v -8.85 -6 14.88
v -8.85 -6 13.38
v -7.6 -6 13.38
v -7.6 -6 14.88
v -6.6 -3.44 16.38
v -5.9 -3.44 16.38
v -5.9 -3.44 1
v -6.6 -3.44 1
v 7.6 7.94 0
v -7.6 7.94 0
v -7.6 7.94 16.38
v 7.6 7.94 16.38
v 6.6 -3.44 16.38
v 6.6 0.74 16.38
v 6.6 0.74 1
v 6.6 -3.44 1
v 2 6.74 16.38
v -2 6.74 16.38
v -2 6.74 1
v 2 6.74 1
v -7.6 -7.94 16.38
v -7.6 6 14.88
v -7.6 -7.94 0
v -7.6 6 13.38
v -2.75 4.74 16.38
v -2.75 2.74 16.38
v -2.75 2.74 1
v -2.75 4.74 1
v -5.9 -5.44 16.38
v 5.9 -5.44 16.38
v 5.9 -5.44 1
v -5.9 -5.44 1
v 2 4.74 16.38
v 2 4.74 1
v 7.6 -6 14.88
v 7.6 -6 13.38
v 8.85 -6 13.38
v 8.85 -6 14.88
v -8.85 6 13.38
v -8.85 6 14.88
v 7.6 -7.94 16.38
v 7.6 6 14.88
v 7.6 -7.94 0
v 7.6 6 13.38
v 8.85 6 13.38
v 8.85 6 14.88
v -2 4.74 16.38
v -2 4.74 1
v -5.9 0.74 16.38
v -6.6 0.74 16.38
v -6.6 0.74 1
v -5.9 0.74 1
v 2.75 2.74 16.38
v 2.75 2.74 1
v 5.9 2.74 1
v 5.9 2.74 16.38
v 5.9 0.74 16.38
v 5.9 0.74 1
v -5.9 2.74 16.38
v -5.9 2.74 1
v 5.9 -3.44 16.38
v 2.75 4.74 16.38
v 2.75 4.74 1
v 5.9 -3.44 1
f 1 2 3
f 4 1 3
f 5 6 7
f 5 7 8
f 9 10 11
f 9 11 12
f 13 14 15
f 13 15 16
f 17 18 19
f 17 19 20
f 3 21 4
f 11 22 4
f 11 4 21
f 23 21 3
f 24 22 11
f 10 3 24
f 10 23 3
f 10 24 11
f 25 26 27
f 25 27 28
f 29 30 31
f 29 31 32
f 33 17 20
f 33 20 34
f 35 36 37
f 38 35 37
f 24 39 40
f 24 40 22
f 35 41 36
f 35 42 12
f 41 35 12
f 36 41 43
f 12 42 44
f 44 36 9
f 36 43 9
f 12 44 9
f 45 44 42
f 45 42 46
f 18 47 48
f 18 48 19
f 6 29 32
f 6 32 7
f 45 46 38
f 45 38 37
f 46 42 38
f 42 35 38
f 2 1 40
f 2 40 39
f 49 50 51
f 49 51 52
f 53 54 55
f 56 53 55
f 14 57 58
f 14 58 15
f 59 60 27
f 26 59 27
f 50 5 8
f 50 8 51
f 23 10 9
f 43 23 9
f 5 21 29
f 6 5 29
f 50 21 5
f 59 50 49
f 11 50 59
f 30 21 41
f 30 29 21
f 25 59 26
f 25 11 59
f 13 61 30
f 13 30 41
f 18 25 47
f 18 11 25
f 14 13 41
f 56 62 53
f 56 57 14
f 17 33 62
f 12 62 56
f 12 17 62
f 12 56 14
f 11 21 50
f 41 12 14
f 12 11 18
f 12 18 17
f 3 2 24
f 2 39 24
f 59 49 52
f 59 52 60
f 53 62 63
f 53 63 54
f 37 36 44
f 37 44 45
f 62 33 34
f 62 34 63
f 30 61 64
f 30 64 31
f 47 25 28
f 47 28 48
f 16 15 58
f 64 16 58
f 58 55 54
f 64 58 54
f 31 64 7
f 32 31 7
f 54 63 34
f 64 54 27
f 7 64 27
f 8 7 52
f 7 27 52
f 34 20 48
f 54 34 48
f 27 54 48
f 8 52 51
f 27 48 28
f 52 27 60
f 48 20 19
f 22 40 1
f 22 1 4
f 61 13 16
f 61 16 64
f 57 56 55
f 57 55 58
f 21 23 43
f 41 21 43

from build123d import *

# Parameters (mm, degrees)
SKETCH1_W           = 15.2
SKETCH1_H           = 15.88
BOSS_EXTRUDE1_DEPTH = 16.38
CUT_EXTRUDE1_DEPTH  = 15.38
SKETCH3_W           = 1.25
SKETCH3_H           = 1.5
BOSS_EXTRUDE2_DEPTH = 6


with BuildPart() as part:
    # Sketch1 → Boss-Extrude1 (new body)
    with BuildSketch(Plane.XY):
        Rectangle(SKETCH1_W, SKETCH1_H)
    extrude(amount=BOSS_EXTRUDE1_DEPTH)

    # Sketch2 → Cut-Extrude1 (cut)
    with BuildSketch(Plane.XY.offset(16.38)):
        Polygon((-2, 6.74), (2, 6.74), (2, 4.74), (2.75, 4.74), (2.75, 2.74), (5.9, 2.74), (5.9, 0.74), (6.6, 0.74), (6.6, -3.44), (5.9, -3.44), (5.9, -5.44), (-5.9, -5.44), (-5.9, -3.44), (-6.6, -3.44), (-6.6, 0.74), (-5.9, 0.74), (-5.9, 2.74), (-2.75, 2.74), (-2.75, 4.74), (-2, 4.74), align=None)
    extrude(amount=-CUT_EXTRUDE1_DEPTH, mode=Mode.SUBTRACT)

    # Sketch3 → Boss-Extrude2 (add, symmetric)
    with BuildSketch(Plane(origin=(0, 0, 0), x_dir=(1, 0, 0), z_dir=(0, 1, 0))):
        with Locations((8.225, -14.13)):
            Rectangle(SKETCH3_W, SKETCH3_H)
        with Locations((-8.225, -14.13)):
            Rectangle(SKETCH3_W, SKETCH3_H)
    extrude(amount=BOSS_EXTRUDE2_DEPTH, both=True)


solid = part.part
